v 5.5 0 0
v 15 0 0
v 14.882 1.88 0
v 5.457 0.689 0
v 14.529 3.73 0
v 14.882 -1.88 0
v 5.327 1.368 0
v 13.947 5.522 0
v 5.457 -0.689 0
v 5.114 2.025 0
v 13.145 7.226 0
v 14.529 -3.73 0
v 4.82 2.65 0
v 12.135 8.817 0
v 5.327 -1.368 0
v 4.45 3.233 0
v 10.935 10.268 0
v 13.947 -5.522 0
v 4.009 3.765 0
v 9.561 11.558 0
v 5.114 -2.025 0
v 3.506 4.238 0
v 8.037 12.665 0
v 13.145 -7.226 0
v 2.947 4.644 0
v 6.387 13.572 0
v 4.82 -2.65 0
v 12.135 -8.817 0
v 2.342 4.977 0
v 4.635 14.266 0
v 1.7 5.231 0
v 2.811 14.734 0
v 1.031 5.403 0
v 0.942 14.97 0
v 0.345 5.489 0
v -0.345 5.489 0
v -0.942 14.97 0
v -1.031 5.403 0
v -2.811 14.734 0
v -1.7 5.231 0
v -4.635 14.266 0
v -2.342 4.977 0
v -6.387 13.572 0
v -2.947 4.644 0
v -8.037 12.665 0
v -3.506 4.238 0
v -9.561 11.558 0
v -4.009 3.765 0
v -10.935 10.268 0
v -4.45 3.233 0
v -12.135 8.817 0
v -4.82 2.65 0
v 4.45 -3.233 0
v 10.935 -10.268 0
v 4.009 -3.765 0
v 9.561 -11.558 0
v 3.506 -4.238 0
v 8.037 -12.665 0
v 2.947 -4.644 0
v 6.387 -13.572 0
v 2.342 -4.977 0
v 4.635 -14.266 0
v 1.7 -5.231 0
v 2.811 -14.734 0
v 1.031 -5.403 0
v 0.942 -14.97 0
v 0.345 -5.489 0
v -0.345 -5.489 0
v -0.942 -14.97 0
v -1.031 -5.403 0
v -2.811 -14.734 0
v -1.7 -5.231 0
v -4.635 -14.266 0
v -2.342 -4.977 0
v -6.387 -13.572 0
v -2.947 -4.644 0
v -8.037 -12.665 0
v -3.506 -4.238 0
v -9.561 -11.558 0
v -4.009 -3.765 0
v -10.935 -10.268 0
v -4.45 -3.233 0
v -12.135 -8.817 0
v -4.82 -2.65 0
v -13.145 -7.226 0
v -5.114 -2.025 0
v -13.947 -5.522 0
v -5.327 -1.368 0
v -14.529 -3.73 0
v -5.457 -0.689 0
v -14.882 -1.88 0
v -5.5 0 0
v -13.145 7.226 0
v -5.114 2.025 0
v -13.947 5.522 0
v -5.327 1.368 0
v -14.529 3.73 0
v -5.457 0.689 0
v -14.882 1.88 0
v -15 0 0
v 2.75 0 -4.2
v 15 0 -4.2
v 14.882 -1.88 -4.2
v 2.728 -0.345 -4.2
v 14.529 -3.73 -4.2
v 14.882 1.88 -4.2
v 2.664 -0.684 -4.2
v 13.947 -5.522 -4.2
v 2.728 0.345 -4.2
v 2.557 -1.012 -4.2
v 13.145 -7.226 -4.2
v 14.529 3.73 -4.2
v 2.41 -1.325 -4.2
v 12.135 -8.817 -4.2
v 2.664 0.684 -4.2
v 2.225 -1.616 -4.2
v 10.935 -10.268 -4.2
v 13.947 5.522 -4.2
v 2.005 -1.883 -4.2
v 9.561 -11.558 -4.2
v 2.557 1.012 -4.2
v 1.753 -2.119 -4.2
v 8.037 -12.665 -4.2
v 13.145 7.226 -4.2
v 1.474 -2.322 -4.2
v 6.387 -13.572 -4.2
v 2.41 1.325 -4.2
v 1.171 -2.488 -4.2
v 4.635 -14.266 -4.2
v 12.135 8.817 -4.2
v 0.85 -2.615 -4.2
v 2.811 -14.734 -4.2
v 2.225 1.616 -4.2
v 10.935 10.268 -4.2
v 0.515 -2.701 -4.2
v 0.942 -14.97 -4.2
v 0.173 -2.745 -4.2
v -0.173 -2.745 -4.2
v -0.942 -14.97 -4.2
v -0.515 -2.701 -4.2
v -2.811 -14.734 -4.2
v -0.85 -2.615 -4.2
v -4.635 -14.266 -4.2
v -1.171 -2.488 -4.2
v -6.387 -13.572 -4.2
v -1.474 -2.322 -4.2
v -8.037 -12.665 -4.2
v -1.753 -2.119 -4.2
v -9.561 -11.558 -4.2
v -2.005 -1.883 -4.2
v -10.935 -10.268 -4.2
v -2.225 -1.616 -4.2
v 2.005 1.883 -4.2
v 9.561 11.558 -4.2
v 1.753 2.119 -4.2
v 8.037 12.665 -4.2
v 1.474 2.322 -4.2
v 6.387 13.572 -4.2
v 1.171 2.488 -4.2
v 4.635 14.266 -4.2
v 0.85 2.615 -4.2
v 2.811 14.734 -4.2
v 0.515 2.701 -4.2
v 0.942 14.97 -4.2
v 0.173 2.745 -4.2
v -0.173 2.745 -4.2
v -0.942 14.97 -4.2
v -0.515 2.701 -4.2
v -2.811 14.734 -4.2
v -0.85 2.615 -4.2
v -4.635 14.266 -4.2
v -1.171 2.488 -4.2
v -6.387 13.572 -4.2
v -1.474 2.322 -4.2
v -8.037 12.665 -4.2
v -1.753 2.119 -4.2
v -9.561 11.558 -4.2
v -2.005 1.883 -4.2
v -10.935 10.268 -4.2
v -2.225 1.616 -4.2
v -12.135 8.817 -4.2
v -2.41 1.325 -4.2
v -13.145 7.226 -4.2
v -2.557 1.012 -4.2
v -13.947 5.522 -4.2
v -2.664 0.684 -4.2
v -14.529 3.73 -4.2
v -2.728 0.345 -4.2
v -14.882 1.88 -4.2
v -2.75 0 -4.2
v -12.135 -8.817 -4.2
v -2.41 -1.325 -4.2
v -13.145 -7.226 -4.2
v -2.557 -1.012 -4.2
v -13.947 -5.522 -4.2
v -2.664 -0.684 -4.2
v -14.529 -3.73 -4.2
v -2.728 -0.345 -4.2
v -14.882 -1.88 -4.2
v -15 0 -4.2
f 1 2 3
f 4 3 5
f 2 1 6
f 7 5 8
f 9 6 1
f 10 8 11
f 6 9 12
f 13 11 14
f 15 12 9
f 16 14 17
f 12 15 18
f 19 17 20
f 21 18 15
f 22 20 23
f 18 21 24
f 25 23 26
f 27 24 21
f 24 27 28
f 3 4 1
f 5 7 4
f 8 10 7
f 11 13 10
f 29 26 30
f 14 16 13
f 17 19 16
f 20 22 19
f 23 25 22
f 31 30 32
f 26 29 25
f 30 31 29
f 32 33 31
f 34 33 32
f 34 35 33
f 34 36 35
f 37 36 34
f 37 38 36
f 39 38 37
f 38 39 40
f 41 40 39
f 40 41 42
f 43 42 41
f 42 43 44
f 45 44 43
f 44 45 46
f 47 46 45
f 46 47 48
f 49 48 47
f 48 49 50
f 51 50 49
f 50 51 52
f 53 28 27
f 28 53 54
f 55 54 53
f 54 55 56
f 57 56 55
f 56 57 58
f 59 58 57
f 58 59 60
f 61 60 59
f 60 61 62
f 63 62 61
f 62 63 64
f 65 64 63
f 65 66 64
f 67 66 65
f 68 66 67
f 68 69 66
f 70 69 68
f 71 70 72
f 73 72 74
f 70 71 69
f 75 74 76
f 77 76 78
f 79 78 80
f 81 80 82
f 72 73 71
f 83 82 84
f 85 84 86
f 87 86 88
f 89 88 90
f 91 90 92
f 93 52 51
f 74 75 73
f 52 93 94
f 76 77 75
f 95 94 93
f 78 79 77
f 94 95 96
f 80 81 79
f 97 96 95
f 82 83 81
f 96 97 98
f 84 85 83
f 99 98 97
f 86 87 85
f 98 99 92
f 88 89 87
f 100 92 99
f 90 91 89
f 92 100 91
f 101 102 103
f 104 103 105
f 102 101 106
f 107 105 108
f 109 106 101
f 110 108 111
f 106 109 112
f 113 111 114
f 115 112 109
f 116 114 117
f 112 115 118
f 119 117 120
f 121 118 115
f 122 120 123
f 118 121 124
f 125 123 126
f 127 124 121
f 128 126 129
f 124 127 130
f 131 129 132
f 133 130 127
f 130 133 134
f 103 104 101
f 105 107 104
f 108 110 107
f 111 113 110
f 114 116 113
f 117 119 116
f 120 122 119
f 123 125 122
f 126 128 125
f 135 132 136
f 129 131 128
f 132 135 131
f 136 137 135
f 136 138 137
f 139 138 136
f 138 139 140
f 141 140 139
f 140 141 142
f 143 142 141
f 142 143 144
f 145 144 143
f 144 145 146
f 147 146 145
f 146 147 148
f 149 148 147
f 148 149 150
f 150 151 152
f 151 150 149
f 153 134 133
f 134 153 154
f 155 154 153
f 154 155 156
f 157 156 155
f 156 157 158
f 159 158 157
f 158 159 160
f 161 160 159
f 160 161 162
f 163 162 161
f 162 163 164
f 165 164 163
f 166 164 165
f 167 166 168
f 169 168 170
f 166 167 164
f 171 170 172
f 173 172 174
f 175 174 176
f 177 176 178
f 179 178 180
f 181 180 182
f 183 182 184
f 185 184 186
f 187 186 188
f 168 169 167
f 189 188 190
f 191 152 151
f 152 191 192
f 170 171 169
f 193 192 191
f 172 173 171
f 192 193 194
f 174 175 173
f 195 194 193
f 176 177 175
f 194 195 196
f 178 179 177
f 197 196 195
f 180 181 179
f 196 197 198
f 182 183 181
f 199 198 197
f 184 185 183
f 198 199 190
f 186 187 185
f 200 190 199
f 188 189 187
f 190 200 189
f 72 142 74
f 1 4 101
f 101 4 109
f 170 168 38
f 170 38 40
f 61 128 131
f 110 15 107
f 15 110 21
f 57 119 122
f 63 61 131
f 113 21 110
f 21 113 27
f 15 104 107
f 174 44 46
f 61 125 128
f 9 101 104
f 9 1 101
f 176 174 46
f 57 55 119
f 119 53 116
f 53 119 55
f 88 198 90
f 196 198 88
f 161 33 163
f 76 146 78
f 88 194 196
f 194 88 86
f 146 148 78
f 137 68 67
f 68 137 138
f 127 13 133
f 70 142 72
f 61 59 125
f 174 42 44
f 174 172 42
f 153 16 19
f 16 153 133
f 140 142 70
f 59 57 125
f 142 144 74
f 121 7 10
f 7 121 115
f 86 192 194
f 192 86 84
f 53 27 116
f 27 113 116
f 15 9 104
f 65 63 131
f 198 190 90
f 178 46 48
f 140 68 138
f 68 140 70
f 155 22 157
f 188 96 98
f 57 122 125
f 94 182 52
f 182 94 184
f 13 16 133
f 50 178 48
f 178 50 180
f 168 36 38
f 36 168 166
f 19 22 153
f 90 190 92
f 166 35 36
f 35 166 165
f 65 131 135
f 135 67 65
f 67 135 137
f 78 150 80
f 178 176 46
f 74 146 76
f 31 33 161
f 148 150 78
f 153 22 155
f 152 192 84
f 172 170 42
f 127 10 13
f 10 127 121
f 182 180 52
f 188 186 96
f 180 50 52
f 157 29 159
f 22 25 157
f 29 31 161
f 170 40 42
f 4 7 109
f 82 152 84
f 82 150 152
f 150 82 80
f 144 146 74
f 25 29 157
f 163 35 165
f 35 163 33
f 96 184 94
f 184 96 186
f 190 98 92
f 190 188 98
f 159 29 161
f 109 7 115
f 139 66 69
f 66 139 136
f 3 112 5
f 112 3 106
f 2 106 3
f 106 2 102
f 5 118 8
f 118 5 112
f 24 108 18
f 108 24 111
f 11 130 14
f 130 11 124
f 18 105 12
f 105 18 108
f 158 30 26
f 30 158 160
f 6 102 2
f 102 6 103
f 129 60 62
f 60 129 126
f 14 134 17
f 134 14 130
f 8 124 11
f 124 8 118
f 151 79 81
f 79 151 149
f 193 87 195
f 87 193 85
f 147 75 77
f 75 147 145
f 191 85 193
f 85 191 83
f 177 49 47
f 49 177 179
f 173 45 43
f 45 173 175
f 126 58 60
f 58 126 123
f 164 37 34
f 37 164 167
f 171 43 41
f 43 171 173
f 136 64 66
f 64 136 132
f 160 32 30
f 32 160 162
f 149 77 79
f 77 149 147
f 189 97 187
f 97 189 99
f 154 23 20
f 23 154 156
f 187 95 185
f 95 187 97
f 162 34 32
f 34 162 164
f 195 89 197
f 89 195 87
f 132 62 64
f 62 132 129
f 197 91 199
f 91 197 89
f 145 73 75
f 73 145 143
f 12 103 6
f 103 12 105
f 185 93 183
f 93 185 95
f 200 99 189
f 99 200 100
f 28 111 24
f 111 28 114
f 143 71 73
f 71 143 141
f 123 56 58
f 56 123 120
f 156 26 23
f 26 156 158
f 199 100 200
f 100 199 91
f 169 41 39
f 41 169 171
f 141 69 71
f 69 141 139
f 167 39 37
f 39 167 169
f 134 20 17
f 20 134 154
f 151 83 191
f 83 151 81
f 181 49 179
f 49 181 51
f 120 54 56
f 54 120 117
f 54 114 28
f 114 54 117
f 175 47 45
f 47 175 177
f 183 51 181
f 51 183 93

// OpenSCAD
$fn = 50;


difference() {
	union() {
		translate(v = [0, 0, -4.2000000000]) {
			cylinder(h = 4.2000000000, r = 15.0000000000);
		}
	}
	union() {
		translate(v = [0, 0, 0]) {
			rotate(a = [0, 0, 0]) {
				difference() {
					union() {
						translate(v = [0, 0, -4.2000000000]) {
							cylinder(h = 4.2000000000, r = 2.2500000000);
						}
						translate(v = [0, 0, -4.2000000000]) {
							cylinder(h = 4.2000000000, r1 = 2.7500000000, r2 = 5.5000000000);
						}
						translate(v = [0, 0, -4.2000000000]) {
							cylinder(h = 4.2000000000, r = 2.7500000000);
						}
						translate(v = [0, 0, -4.2000000000]) {
							cylinder(h = 4.2000000000, r = 2.2500000000);
						}
					}
					union();
				}
			}
		}
	}
}
